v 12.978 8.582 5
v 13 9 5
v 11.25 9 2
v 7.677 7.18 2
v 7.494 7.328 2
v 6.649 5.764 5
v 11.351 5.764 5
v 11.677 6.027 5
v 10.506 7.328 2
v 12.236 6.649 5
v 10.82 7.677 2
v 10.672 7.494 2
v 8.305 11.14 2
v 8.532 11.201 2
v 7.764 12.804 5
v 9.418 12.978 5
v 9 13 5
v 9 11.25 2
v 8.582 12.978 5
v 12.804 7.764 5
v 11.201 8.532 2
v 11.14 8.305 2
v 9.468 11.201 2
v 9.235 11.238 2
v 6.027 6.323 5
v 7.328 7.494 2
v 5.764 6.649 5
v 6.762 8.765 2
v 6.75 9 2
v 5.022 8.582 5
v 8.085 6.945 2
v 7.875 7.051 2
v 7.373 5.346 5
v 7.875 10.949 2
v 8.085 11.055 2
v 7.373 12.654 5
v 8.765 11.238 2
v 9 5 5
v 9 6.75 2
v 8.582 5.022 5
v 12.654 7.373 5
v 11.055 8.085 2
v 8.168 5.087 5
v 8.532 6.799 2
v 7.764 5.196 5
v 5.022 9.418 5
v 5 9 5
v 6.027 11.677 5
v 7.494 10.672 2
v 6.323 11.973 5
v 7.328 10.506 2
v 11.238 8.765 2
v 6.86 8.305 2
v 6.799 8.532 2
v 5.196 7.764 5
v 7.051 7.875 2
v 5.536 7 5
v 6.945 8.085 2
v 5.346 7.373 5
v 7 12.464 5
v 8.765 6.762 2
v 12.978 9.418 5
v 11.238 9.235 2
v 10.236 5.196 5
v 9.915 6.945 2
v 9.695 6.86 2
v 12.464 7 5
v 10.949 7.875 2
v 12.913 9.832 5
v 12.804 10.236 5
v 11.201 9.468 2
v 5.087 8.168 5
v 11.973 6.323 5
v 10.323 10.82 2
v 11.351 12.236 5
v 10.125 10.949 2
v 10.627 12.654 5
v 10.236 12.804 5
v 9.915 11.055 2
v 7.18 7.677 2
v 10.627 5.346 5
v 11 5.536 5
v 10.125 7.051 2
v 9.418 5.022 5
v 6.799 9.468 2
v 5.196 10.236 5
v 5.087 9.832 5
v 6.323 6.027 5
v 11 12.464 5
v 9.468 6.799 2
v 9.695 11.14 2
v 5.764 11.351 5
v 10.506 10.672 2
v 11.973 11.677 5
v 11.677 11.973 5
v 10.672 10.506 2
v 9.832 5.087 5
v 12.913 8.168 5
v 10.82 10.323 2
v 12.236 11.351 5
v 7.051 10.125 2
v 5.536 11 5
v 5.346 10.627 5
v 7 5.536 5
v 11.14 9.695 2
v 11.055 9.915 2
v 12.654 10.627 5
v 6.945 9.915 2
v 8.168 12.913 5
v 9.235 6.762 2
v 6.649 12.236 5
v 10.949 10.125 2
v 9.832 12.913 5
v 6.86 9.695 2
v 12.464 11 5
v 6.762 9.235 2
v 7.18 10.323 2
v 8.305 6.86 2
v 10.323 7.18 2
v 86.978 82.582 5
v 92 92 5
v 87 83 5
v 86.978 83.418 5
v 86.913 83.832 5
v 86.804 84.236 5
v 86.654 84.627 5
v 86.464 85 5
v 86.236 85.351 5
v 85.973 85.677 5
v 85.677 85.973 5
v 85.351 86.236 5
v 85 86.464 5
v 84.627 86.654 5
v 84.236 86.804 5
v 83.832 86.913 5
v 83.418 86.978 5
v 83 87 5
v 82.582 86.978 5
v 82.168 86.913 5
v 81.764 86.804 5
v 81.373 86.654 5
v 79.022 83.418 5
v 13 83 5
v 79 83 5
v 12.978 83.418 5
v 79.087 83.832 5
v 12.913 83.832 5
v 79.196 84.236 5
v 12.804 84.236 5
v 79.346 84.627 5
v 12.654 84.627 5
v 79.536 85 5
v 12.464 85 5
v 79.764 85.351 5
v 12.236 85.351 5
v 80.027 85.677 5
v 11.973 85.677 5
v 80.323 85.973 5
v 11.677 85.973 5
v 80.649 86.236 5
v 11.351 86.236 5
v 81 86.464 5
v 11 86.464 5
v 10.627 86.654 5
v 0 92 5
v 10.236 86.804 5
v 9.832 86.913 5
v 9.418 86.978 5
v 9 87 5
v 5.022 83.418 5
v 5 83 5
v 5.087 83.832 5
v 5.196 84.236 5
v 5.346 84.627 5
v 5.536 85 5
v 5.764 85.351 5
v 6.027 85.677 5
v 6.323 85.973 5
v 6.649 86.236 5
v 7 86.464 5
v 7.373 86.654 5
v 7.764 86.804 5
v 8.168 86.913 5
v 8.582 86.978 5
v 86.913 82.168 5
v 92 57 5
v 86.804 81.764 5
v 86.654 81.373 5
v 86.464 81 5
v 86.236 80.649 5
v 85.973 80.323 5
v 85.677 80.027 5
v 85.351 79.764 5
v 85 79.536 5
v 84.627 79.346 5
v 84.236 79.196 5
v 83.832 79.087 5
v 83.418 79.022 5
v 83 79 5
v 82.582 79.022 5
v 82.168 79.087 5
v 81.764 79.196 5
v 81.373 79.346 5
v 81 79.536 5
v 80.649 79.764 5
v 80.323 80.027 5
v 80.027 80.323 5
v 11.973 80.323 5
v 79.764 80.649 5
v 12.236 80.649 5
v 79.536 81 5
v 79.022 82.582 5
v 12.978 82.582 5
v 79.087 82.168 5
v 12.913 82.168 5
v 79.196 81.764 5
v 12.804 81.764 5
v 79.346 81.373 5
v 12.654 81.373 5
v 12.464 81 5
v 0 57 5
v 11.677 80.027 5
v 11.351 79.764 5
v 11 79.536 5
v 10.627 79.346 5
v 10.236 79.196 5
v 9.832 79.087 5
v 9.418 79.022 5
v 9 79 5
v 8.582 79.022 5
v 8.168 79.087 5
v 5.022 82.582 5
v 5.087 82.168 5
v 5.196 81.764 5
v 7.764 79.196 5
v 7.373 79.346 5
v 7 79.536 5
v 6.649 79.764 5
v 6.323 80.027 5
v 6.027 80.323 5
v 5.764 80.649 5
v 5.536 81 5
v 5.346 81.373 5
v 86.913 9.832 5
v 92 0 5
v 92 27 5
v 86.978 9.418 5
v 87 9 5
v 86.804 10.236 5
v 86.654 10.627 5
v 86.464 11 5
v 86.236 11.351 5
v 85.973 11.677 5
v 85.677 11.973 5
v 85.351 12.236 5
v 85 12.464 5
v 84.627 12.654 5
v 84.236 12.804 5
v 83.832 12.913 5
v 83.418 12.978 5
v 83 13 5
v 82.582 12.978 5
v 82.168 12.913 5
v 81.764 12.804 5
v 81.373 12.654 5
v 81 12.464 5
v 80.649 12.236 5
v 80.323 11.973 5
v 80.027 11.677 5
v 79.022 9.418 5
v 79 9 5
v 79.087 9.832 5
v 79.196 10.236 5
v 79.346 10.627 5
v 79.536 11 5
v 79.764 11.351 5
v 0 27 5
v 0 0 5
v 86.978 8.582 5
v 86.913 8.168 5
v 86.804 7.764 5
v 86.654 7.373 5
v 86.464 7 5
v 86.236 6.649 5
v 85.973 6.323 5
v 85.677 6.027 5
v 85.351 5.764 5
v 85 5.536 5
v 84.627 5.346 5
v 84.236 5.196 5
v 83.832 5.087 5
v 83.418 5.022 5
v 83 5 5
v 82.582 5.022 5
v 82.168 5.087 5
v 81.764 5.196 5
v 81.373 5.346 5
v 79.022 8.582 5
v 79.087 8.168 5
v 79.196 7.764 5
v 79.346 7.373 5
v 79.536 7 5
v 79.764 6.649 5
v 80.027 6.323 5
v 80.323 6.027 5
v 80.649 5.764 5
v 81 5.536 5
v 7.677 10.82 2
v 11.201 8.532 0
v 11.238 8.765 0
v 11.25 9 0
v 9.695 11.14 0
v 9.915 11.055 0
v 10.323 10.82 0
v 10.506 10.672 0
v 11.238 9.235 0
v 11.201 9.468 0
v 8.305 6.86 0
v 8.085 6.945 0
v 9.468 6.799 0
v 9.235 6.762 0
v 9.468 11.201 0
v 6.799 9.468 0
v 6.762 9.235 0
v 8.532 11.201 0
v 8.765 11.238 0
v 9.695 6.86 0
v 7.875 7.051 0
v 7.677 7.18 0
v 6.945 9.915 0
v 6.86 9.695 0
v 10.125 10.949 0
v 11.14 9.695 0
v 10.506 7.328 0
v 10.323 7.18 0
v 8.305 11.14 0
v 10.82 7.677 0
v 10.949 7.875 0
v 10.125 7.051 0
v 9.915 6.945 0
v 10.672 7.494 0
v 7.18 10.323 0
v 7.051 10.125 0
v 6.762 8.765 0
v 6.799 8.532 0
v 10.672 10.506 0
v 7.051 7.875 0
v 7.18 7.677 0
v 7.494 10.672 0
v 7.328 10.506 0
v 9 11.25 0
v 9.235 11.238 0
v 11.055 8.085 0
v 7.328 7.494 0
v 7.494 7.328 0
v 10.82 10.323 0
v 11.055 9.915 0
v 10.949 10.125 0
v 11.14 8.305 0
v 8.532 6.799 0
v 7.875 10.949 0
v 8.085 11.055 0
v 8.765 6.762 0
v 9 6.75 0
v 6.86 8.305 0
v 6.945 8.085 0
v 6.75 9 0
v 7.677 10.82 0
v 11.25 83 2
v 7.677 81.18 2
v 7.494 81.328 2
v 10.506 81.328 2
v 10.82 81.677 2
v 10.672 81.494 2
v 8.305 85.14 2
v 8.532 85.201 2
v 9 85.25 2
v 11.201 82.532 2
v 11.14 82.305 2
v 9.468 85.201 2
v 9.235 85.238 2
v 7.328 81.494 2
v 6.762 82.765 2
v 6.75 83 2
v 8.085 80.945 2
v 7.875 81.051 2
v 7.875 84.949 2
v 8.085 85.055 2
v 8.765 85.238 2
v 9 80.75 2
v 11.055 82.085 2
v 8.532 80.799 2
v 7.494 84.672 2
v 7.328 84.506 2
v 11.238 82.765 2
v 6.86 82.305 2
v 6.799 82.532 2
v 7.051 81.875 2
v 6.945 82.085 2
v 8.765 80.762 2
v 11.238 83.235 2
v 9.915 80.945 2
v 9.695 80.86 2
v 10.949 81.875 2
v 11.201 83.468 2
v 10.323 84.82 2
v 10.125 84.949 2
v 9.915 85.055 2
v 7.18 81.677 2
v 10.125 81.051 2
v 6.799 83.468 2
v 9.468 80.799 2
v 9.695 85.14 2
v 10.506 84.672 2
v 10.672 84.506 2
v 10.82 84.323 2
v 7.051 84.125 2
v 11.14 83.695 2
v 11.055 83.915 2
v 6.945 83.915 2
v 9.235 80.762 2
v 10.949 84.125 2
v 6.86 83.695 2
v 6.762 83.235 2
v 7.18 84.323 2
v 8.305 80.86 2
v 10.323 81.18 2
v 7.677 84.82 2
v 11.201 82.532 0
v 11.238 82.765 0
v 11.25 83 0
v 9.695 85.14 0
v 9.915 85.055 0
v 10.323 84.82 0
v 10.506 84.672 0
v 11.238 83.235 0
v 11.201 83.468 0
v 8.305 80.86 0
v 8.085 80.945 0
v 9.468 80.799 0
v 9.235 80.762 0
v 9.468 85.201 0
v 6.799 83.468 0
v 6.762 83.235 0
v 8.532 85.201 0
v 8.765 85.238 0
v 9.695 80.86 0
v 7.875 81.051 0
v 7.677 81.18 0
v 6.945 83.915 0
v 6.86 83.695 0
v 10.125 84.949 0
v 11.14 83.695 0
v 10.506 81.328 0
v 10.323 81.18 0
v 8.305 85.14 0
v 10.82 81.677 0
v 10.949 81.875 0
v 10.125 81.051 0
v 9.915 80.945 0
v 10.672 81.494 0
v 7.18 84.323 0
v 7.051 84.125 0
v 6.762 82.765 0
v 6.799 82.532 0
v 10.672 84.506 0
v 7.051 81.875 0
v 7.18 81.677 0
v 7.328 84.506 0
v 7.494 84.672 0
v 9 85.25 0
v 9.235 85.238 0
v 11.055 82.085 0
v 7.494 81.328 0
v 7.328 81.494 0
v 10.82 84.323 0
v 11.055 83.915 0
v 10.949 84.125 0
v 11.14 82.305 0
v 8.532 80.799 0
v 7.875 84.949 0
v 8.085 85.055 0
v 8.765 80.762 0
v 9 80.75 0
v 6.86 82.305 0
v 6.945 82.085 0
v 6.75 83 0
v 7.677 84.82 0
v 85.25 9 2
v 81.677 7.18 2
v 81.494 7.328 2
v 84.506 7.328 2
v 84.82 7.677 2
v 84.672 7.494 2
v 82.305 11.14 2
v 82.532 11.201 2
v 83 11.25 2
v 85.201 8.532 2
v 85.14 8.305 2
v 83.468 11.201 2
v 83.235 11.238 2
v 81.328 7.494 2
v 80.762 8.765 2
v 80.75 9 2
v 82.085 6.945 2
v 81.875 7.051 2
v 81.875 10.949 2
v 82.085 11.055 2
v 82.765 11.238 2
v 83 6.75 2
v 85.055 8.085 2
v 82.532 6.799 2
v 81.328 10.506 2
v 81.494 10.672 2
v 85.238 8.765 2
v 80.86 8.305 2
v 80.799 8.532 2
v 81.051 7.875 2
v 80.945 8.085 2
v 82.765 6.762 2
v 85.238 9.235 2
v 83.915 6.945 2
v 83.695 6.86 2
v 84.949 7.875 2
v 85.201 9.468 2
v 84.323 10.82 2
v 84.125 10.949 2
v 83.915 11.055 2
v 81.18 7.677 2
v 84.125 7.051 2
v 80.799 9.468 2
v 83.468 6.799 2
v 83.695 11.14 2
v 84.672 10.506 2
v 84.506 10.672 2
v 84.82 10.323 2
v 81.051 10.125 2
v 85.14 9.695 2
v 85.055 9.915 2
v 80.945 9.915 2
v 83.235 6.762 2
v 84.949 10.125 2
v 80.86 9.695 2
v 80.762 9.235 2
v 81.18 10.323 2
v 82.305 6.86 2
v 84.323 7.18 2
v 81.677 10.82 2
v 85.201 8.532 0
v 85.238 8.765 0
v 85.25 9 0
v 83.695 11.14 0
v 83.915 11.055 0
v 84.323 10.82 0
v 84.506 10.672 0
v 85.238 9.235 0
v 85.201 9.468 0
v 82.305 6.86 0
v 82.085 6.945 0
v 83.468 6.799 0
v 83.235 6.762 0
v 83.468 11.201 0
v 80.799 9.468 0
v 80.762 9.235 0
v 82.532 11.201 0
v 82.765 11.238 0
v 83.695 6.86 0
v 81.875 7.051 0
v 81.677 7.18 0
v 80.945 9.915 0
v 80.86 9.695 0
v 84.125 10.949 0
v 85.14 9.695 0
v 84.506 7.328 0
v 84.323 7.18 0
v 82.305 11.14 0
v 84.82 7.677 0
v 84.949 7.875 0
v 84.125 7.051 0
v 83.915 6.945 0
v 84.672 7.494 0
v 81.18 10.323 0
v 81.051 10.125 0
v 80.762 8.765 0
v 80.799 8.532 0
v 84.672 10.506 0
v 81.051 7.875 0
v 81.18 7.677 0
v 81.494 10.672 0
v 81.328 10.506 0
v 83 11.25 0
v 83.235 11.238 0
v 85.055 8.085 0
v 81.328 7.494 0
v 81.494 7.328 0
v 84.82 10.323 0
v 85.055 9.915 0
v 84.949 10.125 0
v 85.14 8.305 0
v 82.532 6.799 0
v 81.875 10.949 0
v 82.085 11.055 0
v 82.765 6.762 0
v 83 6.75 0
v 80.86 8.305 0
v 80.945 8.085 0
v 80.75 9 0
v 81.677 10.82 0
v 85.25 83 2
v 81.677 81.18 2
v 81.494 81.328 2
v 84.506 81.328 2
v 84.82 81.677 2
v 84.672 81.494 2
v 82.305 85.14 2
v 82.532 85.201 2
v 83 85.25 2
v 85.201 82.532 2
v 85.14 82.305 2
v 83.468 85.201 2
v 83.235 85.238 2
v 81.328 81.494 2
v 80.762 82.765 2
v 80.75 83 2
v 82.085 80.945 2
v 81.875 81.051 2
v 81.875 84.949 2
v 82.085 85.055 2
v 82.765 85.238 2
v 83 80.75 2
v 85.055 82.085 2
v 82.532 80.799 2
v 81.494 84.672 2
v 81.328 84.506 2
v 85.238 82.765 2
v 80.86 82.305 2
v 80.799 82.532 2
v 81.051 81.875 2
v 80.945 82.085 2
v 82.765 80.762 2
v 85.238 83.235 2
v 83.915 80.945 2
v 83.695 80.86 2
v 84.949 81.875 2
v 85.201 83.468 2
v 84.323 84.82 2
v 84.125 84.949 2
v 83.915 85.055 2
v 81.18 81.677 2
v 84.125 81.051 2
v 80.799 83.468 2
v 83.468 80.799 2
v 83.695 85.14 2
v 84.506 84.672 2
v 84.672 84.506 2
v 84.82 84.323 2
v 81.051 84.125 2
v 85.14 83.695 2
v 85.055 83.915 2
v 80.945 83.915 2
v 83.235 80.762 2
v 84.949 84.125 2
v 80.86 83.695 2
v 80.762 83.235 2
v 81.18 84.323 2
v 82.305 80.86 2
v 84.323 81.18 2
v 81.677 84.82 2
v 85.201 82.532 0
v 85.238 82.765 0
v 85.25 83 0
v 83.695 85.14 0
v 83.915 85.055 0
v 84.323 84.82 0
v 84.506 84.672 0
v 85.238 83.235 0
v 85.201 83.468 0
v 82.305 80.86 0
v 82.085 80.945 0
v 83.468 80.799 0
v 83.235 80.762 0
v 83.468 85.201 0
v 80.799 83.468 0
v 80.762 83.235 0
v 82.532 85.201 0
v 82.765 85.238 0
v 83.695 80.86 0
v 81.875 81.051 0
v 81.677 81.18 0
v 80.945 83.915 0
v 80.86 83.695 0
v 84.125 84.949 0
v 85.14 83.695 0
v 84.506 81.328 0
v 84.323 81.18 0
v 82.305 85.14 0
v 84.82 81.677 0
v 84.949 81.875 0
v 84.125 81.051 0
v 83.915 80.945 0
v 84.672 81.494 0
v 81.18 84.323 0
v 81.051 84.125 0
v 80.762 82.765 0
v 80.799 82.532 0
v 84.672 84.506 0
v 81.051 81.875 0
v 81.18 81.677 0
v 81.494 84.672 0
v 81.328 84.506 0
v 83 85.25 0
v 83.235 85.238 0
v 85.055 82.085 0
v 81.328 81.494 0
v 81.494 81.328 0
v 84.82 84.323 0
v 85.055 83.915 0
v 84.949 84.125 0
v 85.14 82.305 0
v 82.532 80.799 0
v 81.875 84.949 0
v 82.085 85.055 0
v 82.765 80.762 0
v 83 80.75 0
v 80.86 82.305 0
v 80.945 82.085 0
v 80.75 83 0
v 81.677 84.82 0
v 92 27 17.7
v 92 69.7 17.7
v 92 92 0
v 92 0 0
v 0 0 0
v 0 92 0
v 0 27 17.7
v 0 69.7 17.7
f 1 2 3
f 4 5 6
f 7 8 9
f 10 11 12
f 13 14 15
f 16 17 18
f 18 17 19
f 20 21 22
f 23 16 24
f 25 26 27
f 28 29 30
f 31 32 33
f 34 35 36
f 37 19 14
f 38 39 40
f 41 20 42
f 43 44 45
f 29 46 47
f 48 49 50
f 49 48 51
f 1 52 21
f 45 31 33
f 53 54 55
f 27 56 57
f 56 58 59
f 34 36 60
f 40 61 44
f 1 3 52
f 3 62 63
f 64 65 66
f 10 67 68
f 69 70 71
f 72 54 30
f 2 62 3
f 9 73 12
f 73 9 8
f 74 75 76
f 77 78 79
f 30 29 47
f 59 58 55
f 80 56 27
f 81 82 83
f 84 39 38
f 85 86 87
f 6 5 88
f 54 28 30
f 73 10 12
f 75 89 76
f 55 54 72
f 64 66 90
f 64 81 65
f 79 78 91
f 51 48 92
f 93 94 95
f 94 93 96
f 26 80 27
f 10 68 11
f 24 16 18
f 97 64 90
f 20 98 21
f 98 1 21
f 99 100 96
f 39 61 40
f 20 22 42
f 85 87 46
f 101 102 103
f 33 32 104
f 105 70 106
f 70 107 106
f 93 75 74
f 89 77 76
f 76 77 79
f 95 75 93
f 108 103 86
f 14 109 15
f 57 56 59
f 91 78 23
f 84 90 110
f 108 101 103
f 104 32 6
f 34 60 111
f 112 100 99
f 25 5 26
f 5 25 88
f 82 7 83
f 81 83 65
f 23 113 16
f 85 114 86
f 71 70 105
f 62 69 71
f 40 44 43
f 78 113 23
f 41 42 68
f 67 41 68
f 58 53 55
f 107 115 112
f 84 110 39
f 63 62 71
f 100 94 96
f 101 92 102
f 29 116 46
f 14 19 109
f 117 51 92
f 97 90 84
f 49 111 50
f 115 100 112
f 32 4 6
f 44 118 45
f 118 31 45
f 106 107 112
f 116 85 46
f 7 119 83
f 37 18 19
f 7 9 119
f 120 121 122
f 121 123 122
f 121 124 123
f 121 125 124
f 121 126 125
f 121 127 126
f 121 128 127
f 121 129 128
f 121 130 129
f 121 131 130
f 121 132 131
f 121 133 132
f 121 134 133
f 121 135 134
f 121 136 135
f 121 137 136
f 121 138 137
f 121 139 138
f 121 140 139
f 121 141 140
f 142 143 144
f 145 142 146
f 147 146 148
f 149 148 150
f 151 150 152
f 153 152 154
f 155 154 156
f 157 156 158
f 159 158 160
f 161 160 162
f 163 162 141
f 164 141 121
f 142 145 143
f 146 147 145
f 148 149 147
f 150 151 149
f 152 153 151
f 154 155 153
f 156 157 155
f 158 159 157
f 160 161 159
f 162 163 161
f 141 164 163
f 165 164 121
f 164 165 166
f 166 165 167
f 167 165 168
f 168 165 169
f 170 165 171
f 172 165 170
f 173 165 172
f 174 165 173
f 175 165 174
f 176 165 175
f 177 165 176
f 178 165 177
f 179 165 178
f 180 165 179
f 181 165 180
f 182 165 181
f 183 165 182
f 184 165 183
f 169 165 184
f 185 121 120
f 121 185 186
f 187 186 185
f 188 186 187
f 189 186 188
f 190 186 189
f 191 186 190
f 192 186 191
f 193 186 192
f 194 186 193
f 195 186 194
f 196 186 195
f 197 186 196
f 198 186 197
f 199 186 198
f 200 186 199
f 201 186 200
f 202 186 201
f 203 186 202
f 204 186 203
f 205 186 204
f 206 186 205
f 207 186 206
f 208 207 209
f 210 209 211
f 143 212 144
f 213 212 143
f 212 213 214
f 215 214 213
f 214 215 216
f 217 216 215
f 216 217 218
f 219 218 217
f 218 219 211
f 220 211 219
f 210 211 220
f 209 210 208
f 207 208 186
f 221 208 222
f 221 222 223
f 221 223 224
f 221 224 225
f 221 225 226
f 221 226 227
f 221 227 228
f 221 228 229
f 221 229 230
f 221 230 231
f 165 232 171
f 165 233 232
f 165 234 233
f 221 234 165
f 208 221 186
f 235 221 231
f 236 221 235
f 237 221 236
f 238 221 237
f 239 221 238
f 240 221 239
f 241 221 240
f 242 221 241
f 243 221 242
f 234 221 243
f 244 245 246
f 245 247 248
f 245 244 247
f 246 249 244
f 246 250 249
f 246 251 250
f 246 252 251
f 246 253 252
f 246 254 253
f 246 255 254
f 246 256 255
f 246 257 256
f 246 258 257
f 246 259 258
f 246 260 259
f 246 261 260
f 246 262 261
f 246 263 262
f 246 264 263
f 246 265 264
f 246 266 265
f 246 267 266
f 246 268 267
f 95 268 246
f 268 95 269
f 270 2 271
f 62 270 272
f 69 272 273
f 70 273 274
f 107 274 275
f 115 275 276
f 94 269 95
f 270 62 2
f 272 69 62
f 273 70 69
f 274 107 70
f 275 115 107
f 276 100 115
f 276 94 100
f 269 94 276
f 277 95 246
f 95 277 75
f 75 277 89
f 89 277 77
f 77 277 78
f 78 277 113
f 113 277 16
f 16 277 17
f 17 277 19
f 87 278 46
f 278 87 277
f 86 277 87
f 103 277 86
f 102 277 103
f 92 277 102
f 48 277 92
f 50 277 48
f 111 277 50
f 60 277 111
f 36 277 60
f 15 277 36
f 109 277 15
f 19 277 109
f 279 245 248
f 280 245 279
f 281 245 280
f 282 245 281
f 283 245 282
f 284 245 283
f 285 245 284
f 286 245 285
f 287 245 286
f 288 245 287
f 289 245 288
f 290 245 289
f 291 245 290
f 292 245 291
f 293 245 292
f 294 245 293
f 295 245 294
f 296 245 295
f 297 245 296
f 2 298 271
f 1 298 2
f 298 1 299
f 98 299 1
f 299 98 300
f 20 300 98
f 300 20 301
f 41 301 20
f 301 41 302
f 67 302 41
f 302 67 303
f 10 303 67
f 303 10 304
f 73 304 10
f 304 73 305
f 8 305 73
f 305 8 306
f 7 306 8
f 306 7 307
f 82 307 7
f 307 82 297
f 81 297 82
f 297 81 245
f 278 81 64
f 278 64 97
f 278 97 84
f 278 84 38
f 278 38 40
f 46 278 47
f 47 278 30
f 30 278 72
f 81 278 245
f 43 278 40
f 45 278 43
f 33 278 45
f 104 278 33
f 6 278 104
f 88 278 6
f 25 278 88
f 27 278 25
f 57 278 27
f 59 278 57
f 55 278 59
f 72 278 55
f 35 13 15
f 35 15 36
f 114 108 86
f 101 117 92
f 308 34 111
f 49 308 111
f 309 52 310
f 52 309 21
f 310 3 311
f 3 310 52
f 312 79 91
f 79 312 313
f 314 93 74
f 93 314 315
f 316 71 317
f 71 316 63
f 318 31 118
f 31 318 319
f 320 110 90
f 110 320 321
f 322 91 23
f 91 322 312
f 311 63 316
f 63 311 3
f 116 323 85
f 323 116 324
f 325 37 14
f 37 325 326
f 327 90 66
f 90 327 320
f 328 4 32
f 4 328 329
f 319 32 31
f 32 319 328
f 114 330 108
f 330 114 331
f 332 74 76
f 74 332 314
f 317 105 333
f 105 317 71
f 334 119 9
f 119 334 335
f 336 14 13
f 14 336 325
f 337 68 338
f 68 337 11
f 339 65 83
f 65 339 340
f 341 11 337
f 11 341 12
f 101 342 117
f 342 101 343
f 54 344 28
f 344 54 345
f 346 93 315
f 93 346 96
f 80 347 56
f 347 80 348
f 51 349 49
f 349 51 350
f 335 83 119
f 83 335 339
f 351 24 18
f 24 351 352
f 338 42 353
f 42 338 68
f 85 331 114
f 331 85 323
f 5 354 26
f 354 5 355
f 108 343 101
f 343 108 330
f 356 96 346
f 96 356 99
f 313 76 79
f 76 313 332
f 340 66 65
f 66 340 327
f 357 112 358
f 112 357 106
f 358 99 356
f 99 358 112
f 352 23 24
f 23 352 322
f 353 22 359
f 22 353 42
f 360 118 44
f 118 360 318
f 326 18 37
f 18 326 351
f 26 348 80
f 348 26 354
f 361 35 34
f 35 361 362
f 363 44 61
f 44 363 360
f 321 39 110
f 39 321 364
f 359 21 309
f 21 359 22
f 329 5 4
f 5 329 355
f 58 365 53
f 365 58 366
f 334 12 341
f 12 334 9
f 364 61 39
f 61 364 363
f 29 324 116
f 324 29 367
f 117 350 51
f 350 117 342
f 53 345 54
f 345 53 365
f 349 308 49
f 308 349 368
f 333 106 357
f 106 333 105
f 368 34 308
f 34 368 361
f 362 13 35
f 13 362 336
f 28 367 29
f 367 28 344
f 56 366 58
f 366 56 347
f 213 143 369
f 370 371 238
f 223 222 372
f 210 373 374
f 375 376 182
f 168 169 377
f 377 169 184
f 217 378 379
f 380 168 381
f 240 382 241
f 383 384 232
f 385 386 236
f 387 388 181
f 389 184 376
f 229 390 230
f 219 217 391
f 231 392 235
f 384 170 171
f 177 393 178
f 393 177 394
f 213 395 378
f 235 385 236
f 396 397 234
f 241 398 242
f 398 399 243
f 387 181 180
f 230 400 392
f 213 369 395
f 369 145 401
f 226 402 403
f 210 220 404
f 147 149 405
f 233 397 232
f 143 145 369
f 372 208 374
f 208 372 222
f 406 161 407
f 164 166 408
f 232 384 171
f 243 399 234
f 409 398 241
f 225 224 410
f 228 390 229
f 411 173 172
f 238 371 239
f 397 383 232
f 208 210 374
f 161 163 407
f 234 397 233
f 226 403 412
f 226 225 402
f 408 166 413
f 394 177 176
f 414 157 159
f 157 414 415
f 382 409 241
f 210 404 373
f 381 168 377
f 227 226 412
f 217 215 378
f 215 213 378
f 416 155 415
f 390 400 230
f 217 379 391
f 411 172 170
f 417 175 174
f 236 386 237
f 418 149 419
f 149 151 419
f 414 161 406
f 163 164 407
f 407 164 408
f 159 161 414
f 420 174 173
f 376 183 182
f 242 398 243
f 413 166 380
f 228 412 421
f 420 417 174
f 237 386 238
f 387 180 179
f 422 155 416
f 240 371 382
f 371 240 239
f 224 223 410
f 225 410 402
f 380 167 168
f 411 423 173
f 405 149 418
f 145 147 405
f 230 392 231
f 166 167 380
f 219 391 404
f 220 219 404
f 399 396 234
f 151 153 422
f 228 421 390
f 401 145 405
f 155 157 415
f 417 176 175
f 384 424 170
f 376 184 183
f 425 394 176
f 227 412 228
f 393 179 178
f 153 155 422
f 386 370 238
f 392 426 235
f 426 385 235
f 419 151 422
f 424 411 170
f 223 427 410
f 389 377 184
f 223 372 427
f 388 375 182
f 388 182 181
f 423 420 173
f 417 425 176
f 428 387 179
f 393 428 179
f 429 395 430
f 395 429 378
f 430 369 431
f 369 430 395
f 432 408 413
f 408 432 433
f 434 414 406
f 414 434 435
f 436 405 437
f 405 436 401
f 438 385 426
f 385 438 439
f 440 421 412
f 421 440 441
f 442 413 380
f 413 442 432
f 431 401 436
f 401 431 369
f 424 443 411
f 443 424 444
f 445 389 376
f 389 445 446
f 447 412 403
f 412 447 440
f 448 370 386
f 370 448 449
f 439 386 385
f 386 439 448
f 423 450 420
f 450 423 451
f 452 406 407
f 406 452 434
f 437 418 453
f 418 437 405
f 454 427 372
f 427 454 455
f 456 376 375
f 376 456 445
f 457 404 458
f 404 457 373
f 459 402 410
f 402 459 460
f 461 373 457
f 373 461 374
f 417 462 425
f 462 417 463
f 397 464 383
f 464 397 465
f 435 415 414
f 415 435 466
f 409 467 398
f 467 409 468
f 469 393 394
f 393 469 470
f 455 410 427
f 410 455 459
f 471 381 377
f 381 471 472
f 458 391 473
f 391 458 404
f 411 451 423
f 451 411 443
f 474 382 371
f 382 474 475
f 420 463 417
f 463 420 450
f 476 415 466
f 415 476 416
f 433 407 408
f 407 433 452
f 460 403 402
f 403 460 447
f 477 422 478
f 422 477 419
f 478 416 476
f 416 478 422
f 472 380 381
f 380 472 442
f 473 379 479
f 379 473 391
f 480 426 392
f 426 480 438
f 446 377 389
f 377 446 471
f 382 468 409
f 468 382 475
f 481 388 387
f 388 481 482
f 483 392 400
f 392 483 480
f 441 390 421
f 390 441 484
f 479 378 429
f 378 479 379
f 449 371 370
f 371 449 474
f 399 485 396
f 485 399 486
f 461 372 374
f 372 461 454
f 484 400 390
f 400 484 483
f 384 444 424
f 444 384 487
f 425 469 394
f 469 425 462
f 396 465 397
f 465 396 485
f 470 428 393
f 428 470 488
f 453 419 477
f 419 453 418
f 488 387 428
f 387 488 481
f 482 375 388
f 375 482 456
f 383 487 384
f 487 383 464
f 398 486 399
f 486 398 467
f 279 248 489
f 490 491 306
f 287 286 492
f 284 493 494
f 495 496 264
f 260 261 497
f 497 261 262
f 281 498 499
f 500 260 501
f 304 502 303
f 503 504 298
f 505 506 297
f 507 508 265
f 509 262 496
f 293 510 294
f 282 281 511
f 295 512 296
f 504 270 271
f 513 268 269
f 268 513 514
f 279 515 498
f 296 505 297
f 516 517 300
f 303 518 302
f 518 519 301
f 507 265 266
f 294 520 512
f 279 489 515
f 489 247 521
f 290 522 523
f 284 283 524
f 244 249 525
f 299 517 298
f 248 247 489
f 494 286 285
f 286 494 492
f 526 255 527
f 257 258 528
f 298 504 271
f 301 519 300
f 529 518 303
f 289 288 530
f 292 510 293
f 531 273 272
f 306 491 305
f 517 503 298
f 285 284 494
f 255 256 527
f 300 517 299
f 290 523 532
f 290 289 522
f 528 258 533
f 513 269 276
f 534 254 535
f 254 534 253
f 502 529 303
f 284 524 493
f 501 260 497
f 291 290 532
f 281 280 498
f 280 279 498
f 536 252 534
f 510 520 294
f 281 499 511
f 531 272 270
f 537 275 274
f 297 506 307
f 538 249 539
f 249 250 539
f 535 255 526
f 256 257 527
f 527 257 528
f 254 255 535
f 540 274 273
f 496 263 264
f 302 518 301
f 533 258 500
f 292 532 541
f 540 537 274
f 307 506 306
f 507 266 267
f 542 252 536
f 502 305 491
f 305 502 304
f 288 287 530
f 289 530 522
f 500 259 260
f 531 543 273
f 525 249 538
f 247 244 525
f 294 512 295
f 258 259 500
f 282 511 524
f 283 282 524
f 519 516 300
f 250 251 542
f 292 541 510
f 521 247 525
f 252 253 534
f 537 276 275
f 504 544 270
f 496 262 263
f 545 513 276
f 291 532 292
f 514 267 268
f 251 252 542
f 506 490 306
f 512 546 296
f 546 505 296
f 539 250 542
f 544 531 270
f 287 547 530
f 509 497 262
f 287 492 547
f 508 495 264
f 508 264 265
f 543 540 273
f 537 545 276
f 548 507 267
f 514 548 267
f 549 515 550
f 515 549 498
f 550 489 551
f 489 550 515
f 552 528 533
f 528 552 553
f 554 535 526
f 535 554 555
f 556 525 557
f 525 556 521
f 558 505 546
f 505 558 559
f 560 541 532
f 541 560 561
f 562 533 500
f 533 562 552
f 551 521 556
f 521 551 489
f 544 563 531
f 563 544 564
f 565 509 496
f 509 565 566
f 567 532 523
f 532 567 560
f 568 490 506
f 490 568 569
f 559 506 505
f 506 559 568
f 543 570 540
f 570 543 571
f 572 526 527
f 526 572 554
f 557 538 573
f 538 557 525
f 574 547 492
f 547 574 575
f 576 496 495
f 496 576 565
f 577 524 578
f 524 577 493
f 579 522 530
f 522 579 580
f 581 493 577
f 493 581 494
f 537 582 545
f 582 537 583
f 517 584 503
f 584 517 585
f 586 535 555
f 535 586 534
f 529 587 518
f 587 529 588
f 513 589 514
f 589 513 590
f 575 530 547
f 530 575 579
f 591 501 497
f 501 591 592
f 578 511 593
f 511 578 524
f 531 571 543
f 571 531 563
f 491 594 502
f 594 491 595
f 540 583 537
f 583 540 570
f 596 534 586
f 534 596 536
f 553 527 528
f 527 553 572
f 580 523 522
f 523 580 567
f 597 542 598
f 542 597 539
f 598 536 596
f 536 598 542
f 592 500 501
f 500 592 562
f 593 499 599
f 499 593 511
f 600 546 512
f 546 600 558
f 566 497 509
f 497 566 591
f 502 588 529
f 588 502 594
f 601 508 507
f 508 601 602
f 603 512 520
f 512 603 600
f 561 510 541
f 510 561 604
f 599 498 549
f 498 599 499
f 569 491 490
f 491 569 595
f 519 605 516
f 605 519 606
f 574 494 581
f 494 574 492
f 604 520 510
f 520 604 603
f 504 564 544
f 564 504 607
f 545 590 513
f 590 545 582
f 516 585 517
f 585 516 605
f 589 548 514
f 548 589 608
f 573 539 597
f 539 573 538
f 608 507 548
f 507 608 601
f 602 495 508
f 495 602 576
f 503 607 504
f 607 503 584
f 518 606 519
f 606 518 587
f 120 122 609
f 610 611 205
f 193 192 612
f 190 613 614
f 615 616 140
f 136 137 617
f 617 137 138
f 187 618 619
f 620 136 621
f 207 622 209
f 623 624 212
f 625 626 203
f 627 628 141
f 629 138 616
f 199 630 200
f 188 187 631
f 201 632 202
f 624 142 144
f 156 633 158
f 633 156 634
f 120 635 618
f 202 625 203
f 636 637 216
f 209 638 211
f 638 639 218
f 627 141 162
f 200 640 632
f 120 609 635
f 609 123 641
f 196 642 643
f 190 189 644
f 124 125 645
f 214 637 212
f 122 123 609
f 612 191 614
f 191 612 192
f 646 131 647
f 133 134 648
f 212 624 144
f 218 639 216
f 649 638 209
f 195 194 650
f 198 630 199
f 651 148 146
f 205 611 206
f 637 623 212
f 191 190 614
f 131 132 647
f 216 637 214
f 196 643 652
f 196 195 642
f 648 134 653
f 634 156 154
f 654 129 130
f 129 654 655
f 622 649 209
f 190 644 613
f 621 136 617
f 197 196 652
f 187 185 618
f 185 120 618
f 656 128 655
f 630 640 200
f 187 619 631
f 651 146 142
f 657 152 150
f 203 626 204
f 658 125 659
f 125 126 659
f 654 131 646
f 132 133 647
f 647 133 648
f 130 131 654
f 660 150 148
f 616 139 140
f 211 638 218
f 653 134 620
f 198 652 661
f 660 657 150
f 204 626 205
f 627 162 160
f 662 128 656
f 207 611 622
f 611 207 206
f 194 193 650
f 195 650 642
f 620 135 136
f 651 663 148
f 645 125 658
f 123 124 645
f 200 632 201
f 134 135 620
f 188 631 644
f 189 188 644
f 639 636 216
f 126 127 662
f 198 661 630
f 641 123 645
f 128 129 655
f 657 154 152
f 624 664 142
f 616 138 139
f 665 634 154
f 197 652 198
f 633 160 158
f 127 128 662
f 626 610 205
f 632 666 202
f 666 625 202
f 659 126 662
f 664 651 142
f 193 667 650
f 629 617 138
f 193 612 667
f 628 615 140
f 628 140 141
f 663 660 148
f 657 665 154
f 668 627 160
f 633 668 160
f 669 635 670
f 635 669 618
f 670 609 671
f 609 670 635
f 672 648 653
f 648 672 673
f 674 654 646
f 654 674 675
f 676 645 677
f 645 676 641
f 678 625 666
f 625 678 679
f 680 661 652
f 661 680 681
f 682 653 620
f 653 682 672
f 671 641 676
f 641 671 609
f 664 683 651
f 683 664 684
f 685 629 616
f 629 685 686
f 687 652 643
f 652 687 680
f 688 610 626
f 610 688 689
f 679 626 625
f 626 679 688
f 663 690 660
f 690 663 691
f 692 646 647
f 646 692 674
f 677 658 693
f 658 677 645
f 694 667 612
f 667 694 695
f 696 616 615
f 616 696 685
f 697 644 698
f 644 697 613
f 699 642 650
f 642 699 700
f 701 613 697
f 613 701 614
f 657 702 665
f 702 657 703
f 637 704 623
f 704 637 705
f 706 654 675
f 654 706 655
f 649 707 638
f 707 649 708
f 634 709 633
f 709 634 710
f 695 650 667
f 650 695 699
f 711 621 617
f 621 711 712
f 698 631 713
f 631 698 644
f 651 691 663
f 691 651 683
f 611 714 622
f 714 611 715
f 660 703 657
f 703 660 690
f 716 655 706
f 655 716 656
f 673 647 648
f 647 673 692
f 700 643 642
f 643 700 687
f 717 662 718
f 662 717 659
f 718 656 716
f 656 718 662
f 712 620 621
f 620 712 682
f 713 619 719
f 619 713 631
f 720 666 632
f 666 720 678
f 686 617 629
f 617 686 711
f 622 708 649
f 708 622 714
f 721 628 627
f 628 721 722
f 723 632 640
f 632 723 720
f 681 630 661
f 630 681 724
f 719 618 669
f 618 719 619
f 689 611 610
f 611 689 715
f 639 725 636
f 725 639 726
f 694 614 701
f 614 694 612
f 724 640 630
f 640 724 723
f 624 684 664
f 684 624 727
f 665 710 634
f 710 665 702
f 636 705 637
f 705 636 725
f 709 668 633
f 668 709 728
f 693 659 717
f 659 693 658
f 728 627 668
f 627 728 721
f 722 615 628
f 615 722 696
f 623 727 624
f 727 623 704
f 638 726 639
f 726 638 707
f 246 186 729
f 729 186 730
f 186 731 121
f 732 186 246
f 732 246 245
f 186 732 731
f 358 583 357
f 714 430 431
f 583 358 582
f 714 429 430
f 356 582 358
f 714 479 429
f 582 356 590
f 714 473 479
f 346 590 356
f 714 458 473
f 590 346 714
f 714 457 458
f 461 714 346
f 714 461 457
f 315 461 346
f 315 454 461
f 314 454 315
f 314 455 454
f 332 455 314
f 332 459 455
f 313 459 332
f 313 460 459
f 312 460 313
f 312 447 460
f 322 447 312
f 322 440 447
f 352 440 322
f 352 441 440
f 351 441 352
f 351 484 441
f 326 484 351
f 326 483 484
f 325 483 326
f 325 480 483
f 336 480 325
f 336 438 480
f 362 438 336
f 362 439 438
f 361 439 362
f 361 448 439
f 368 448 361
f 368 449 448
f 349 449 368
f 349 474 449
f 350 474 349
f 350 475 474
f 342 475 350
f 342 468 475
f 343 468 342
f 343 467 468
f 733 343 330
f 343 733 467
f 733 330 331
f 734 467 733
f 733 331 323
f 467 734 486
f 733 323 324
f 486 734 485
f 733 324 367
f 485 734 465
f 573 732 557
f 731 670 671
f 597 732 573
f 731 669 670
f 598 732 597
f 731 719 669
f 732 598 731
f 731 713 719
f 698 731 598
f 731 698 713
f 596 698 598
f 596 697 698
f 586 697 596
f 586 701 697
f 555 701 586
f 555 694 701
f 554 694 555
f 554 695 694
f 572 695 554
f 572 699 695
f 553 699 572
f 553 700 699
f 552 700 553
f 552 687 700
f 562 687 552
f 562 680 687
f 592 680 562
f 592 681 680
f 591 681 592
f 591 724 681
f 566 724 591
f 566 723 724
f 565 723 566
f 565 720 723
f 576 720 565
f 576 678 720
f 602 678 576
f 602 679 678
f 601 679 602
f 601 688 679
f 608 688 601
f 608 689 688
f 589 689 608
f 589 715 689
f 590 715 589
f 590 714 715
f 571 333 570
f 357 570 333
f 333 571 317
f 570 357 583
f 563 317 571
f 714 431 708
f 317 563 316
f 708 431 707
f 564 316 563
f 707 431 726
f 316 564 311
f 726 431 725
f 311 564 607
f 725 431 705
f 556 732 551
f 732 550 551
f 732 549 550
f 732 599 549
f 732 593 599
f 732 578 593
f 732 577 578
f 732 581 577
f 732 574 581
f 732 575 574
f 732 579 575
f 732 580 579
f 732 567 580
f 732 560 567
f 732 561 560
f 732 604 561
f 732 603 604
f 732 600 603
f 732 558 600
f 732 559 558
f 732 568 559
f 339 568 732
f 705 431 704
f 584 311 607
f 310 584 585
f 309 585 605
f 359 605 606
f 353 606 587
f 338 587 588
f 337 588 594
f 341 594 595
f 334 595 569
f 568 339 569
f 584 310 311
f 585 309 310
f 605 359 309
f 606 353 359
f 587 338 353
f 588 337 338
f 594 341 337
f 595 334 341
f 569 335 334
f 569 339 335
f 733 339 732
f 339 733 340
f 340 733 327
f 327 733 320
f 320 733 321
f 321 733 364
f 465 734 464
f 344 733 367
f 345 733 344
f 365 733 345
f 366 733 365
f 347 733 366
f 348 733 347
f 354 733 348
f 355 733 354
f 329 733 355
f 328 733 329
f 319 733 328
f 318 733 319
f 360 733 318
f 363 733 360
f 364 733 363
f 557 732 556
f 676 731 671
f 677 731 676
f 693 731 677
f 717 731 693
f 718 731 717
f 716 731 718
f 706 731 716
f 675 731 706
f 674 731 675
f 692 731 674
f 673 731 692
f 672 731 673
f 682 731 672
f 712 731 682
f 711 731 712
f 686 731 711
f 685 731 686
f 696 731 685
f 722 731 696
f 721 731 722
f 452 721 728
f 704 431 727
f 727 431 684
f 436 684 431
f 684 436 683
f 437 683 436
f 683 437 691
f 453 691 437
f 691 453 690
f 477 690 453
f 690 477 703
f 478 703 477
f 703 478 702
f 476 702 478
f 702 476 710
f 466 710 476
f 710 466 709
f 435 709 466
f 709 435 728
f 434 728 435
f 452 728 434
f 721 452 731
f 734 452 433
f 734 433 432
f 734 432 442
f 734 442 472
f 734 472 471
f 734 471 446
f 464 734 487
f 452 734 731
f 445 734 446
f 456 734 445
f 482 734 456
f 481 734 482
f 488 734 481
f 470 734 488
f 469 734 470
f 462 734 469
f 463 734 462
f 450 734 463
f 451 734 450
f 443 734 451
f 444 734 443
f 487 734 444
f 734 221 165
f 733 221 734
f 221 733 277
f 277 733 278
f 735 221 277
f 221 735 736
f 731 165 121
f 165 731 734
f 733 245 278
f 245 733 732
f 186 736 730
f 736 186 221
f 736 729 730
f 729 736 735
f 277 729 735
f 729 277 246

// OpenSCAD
/* [Specs] */
// Distance between bolt holes
spacing = 70;
// Thickness of the plate (Not recommended to change)
thickness = 5;
// Distance from outer edge to the bolts (Not recommended to change)
padding = 3;
// Bore offset (non-standard) - if you need to change the origin of where the bores are drilled
// offset = 0;
offset = -2; // Weird unstandard mount has distance of 70 /between/ bores with a width of 5 instead of being 100 between center points.

/* Cleat */
// The width of the cleat. 12.7mm is 1/2" which is the standard size.
cleat_depth = 12.7;

/* [Hidden] */
m12_l = 12;
m12_hd = 8;
m12_hl= 3;
m12_sd = 4.5;
m12_offset = padding + m12_hd;
plate_size = spacing + m12_offset*2;
cleat_width = spacing - m12_l;

// model countersunk screw for 3d printing
// useful for creating attachment bores
// which fit these screws
// default values are for 3mm x 20mm screw with 6mm head (3.2mm bore for tolerance)
module countersink(
  l = 20,   // length
  hd = 6,   // head dia
  hl = 3,   // head length
  sd = 3.2, // shaft dia
  ph = 0,   // pocket hole height/depth
) {
  union() {
    translate([0, 0, -ph])
      cylinder(h=ph, r1=hd/2, r2=hd/2, $fn=60);
    cylinder(h=hl, r1=hd/2, r2=sd/2, $fn=60);
    cylinder(h=l, r1=sd/2, r2=sd/2, $fn=60);
  }
}

module frenchcleat(w=20, d=10) {
  linear_extrude(d)
    polygon([[0,0],[w,0],[0,w]]);
}

module bolt() {
  translate([0, 0, thickness])
  rotate([180, 0, 0])
    countersink(l=m12_l, hd=m12_hd, hl=m12_hl, sd=m12_sd);
}

module plate() {
  difference() {
    cube([plate_size, plate_size, thickness]);

    for (i=[m12_offset+offset, plate_size - m12_offset - offset]) {
      for (j=[m12_offset+offset, plate_size - m12_offset - offset]) {
        translate([i, j, 0])
         # bolt();
      }
    }
  }
}

module outline(sizeX, sizeY) {
  sizeX = sizeX == undef ? 0 : sizeX;
  sizeY = sizeY == undef ? sizeX : sizeY;

  difference() {
    square([sizeX, sizeY]);
    translate([0.5, 0.5, 0])
    square([sizeX-1, sizeY-1]);
  }
}

module plate_cleat() {
  translate([m12_offset + m12_l/2, 30, 0])
  translate([0, 0, cleat_depth + thickness])
  rotate([0, 90, 0])
    frenchcleat(cleat_depth, plate_size);
}

union() {
  plate();
  translate([-(m12_offset + m12_l/2), m12_offset + m12_l/2 + 10, 0]) {
    plate_cleat();
    translate([m12_offset + m12_l/2, 0, thickness])
    cube([plate_size, 30, cleat_depth]);
  }
}


// color("red")
// translate([m12_offset, m12_offset/2, 0])
// outline(70, 80);
//
// hole_dia=5;
// color("green")
// translate([m12_offset+(hole_dia/2), m12_offset+(hole_dia/2), 0])
// outline(70-hole_dia);
